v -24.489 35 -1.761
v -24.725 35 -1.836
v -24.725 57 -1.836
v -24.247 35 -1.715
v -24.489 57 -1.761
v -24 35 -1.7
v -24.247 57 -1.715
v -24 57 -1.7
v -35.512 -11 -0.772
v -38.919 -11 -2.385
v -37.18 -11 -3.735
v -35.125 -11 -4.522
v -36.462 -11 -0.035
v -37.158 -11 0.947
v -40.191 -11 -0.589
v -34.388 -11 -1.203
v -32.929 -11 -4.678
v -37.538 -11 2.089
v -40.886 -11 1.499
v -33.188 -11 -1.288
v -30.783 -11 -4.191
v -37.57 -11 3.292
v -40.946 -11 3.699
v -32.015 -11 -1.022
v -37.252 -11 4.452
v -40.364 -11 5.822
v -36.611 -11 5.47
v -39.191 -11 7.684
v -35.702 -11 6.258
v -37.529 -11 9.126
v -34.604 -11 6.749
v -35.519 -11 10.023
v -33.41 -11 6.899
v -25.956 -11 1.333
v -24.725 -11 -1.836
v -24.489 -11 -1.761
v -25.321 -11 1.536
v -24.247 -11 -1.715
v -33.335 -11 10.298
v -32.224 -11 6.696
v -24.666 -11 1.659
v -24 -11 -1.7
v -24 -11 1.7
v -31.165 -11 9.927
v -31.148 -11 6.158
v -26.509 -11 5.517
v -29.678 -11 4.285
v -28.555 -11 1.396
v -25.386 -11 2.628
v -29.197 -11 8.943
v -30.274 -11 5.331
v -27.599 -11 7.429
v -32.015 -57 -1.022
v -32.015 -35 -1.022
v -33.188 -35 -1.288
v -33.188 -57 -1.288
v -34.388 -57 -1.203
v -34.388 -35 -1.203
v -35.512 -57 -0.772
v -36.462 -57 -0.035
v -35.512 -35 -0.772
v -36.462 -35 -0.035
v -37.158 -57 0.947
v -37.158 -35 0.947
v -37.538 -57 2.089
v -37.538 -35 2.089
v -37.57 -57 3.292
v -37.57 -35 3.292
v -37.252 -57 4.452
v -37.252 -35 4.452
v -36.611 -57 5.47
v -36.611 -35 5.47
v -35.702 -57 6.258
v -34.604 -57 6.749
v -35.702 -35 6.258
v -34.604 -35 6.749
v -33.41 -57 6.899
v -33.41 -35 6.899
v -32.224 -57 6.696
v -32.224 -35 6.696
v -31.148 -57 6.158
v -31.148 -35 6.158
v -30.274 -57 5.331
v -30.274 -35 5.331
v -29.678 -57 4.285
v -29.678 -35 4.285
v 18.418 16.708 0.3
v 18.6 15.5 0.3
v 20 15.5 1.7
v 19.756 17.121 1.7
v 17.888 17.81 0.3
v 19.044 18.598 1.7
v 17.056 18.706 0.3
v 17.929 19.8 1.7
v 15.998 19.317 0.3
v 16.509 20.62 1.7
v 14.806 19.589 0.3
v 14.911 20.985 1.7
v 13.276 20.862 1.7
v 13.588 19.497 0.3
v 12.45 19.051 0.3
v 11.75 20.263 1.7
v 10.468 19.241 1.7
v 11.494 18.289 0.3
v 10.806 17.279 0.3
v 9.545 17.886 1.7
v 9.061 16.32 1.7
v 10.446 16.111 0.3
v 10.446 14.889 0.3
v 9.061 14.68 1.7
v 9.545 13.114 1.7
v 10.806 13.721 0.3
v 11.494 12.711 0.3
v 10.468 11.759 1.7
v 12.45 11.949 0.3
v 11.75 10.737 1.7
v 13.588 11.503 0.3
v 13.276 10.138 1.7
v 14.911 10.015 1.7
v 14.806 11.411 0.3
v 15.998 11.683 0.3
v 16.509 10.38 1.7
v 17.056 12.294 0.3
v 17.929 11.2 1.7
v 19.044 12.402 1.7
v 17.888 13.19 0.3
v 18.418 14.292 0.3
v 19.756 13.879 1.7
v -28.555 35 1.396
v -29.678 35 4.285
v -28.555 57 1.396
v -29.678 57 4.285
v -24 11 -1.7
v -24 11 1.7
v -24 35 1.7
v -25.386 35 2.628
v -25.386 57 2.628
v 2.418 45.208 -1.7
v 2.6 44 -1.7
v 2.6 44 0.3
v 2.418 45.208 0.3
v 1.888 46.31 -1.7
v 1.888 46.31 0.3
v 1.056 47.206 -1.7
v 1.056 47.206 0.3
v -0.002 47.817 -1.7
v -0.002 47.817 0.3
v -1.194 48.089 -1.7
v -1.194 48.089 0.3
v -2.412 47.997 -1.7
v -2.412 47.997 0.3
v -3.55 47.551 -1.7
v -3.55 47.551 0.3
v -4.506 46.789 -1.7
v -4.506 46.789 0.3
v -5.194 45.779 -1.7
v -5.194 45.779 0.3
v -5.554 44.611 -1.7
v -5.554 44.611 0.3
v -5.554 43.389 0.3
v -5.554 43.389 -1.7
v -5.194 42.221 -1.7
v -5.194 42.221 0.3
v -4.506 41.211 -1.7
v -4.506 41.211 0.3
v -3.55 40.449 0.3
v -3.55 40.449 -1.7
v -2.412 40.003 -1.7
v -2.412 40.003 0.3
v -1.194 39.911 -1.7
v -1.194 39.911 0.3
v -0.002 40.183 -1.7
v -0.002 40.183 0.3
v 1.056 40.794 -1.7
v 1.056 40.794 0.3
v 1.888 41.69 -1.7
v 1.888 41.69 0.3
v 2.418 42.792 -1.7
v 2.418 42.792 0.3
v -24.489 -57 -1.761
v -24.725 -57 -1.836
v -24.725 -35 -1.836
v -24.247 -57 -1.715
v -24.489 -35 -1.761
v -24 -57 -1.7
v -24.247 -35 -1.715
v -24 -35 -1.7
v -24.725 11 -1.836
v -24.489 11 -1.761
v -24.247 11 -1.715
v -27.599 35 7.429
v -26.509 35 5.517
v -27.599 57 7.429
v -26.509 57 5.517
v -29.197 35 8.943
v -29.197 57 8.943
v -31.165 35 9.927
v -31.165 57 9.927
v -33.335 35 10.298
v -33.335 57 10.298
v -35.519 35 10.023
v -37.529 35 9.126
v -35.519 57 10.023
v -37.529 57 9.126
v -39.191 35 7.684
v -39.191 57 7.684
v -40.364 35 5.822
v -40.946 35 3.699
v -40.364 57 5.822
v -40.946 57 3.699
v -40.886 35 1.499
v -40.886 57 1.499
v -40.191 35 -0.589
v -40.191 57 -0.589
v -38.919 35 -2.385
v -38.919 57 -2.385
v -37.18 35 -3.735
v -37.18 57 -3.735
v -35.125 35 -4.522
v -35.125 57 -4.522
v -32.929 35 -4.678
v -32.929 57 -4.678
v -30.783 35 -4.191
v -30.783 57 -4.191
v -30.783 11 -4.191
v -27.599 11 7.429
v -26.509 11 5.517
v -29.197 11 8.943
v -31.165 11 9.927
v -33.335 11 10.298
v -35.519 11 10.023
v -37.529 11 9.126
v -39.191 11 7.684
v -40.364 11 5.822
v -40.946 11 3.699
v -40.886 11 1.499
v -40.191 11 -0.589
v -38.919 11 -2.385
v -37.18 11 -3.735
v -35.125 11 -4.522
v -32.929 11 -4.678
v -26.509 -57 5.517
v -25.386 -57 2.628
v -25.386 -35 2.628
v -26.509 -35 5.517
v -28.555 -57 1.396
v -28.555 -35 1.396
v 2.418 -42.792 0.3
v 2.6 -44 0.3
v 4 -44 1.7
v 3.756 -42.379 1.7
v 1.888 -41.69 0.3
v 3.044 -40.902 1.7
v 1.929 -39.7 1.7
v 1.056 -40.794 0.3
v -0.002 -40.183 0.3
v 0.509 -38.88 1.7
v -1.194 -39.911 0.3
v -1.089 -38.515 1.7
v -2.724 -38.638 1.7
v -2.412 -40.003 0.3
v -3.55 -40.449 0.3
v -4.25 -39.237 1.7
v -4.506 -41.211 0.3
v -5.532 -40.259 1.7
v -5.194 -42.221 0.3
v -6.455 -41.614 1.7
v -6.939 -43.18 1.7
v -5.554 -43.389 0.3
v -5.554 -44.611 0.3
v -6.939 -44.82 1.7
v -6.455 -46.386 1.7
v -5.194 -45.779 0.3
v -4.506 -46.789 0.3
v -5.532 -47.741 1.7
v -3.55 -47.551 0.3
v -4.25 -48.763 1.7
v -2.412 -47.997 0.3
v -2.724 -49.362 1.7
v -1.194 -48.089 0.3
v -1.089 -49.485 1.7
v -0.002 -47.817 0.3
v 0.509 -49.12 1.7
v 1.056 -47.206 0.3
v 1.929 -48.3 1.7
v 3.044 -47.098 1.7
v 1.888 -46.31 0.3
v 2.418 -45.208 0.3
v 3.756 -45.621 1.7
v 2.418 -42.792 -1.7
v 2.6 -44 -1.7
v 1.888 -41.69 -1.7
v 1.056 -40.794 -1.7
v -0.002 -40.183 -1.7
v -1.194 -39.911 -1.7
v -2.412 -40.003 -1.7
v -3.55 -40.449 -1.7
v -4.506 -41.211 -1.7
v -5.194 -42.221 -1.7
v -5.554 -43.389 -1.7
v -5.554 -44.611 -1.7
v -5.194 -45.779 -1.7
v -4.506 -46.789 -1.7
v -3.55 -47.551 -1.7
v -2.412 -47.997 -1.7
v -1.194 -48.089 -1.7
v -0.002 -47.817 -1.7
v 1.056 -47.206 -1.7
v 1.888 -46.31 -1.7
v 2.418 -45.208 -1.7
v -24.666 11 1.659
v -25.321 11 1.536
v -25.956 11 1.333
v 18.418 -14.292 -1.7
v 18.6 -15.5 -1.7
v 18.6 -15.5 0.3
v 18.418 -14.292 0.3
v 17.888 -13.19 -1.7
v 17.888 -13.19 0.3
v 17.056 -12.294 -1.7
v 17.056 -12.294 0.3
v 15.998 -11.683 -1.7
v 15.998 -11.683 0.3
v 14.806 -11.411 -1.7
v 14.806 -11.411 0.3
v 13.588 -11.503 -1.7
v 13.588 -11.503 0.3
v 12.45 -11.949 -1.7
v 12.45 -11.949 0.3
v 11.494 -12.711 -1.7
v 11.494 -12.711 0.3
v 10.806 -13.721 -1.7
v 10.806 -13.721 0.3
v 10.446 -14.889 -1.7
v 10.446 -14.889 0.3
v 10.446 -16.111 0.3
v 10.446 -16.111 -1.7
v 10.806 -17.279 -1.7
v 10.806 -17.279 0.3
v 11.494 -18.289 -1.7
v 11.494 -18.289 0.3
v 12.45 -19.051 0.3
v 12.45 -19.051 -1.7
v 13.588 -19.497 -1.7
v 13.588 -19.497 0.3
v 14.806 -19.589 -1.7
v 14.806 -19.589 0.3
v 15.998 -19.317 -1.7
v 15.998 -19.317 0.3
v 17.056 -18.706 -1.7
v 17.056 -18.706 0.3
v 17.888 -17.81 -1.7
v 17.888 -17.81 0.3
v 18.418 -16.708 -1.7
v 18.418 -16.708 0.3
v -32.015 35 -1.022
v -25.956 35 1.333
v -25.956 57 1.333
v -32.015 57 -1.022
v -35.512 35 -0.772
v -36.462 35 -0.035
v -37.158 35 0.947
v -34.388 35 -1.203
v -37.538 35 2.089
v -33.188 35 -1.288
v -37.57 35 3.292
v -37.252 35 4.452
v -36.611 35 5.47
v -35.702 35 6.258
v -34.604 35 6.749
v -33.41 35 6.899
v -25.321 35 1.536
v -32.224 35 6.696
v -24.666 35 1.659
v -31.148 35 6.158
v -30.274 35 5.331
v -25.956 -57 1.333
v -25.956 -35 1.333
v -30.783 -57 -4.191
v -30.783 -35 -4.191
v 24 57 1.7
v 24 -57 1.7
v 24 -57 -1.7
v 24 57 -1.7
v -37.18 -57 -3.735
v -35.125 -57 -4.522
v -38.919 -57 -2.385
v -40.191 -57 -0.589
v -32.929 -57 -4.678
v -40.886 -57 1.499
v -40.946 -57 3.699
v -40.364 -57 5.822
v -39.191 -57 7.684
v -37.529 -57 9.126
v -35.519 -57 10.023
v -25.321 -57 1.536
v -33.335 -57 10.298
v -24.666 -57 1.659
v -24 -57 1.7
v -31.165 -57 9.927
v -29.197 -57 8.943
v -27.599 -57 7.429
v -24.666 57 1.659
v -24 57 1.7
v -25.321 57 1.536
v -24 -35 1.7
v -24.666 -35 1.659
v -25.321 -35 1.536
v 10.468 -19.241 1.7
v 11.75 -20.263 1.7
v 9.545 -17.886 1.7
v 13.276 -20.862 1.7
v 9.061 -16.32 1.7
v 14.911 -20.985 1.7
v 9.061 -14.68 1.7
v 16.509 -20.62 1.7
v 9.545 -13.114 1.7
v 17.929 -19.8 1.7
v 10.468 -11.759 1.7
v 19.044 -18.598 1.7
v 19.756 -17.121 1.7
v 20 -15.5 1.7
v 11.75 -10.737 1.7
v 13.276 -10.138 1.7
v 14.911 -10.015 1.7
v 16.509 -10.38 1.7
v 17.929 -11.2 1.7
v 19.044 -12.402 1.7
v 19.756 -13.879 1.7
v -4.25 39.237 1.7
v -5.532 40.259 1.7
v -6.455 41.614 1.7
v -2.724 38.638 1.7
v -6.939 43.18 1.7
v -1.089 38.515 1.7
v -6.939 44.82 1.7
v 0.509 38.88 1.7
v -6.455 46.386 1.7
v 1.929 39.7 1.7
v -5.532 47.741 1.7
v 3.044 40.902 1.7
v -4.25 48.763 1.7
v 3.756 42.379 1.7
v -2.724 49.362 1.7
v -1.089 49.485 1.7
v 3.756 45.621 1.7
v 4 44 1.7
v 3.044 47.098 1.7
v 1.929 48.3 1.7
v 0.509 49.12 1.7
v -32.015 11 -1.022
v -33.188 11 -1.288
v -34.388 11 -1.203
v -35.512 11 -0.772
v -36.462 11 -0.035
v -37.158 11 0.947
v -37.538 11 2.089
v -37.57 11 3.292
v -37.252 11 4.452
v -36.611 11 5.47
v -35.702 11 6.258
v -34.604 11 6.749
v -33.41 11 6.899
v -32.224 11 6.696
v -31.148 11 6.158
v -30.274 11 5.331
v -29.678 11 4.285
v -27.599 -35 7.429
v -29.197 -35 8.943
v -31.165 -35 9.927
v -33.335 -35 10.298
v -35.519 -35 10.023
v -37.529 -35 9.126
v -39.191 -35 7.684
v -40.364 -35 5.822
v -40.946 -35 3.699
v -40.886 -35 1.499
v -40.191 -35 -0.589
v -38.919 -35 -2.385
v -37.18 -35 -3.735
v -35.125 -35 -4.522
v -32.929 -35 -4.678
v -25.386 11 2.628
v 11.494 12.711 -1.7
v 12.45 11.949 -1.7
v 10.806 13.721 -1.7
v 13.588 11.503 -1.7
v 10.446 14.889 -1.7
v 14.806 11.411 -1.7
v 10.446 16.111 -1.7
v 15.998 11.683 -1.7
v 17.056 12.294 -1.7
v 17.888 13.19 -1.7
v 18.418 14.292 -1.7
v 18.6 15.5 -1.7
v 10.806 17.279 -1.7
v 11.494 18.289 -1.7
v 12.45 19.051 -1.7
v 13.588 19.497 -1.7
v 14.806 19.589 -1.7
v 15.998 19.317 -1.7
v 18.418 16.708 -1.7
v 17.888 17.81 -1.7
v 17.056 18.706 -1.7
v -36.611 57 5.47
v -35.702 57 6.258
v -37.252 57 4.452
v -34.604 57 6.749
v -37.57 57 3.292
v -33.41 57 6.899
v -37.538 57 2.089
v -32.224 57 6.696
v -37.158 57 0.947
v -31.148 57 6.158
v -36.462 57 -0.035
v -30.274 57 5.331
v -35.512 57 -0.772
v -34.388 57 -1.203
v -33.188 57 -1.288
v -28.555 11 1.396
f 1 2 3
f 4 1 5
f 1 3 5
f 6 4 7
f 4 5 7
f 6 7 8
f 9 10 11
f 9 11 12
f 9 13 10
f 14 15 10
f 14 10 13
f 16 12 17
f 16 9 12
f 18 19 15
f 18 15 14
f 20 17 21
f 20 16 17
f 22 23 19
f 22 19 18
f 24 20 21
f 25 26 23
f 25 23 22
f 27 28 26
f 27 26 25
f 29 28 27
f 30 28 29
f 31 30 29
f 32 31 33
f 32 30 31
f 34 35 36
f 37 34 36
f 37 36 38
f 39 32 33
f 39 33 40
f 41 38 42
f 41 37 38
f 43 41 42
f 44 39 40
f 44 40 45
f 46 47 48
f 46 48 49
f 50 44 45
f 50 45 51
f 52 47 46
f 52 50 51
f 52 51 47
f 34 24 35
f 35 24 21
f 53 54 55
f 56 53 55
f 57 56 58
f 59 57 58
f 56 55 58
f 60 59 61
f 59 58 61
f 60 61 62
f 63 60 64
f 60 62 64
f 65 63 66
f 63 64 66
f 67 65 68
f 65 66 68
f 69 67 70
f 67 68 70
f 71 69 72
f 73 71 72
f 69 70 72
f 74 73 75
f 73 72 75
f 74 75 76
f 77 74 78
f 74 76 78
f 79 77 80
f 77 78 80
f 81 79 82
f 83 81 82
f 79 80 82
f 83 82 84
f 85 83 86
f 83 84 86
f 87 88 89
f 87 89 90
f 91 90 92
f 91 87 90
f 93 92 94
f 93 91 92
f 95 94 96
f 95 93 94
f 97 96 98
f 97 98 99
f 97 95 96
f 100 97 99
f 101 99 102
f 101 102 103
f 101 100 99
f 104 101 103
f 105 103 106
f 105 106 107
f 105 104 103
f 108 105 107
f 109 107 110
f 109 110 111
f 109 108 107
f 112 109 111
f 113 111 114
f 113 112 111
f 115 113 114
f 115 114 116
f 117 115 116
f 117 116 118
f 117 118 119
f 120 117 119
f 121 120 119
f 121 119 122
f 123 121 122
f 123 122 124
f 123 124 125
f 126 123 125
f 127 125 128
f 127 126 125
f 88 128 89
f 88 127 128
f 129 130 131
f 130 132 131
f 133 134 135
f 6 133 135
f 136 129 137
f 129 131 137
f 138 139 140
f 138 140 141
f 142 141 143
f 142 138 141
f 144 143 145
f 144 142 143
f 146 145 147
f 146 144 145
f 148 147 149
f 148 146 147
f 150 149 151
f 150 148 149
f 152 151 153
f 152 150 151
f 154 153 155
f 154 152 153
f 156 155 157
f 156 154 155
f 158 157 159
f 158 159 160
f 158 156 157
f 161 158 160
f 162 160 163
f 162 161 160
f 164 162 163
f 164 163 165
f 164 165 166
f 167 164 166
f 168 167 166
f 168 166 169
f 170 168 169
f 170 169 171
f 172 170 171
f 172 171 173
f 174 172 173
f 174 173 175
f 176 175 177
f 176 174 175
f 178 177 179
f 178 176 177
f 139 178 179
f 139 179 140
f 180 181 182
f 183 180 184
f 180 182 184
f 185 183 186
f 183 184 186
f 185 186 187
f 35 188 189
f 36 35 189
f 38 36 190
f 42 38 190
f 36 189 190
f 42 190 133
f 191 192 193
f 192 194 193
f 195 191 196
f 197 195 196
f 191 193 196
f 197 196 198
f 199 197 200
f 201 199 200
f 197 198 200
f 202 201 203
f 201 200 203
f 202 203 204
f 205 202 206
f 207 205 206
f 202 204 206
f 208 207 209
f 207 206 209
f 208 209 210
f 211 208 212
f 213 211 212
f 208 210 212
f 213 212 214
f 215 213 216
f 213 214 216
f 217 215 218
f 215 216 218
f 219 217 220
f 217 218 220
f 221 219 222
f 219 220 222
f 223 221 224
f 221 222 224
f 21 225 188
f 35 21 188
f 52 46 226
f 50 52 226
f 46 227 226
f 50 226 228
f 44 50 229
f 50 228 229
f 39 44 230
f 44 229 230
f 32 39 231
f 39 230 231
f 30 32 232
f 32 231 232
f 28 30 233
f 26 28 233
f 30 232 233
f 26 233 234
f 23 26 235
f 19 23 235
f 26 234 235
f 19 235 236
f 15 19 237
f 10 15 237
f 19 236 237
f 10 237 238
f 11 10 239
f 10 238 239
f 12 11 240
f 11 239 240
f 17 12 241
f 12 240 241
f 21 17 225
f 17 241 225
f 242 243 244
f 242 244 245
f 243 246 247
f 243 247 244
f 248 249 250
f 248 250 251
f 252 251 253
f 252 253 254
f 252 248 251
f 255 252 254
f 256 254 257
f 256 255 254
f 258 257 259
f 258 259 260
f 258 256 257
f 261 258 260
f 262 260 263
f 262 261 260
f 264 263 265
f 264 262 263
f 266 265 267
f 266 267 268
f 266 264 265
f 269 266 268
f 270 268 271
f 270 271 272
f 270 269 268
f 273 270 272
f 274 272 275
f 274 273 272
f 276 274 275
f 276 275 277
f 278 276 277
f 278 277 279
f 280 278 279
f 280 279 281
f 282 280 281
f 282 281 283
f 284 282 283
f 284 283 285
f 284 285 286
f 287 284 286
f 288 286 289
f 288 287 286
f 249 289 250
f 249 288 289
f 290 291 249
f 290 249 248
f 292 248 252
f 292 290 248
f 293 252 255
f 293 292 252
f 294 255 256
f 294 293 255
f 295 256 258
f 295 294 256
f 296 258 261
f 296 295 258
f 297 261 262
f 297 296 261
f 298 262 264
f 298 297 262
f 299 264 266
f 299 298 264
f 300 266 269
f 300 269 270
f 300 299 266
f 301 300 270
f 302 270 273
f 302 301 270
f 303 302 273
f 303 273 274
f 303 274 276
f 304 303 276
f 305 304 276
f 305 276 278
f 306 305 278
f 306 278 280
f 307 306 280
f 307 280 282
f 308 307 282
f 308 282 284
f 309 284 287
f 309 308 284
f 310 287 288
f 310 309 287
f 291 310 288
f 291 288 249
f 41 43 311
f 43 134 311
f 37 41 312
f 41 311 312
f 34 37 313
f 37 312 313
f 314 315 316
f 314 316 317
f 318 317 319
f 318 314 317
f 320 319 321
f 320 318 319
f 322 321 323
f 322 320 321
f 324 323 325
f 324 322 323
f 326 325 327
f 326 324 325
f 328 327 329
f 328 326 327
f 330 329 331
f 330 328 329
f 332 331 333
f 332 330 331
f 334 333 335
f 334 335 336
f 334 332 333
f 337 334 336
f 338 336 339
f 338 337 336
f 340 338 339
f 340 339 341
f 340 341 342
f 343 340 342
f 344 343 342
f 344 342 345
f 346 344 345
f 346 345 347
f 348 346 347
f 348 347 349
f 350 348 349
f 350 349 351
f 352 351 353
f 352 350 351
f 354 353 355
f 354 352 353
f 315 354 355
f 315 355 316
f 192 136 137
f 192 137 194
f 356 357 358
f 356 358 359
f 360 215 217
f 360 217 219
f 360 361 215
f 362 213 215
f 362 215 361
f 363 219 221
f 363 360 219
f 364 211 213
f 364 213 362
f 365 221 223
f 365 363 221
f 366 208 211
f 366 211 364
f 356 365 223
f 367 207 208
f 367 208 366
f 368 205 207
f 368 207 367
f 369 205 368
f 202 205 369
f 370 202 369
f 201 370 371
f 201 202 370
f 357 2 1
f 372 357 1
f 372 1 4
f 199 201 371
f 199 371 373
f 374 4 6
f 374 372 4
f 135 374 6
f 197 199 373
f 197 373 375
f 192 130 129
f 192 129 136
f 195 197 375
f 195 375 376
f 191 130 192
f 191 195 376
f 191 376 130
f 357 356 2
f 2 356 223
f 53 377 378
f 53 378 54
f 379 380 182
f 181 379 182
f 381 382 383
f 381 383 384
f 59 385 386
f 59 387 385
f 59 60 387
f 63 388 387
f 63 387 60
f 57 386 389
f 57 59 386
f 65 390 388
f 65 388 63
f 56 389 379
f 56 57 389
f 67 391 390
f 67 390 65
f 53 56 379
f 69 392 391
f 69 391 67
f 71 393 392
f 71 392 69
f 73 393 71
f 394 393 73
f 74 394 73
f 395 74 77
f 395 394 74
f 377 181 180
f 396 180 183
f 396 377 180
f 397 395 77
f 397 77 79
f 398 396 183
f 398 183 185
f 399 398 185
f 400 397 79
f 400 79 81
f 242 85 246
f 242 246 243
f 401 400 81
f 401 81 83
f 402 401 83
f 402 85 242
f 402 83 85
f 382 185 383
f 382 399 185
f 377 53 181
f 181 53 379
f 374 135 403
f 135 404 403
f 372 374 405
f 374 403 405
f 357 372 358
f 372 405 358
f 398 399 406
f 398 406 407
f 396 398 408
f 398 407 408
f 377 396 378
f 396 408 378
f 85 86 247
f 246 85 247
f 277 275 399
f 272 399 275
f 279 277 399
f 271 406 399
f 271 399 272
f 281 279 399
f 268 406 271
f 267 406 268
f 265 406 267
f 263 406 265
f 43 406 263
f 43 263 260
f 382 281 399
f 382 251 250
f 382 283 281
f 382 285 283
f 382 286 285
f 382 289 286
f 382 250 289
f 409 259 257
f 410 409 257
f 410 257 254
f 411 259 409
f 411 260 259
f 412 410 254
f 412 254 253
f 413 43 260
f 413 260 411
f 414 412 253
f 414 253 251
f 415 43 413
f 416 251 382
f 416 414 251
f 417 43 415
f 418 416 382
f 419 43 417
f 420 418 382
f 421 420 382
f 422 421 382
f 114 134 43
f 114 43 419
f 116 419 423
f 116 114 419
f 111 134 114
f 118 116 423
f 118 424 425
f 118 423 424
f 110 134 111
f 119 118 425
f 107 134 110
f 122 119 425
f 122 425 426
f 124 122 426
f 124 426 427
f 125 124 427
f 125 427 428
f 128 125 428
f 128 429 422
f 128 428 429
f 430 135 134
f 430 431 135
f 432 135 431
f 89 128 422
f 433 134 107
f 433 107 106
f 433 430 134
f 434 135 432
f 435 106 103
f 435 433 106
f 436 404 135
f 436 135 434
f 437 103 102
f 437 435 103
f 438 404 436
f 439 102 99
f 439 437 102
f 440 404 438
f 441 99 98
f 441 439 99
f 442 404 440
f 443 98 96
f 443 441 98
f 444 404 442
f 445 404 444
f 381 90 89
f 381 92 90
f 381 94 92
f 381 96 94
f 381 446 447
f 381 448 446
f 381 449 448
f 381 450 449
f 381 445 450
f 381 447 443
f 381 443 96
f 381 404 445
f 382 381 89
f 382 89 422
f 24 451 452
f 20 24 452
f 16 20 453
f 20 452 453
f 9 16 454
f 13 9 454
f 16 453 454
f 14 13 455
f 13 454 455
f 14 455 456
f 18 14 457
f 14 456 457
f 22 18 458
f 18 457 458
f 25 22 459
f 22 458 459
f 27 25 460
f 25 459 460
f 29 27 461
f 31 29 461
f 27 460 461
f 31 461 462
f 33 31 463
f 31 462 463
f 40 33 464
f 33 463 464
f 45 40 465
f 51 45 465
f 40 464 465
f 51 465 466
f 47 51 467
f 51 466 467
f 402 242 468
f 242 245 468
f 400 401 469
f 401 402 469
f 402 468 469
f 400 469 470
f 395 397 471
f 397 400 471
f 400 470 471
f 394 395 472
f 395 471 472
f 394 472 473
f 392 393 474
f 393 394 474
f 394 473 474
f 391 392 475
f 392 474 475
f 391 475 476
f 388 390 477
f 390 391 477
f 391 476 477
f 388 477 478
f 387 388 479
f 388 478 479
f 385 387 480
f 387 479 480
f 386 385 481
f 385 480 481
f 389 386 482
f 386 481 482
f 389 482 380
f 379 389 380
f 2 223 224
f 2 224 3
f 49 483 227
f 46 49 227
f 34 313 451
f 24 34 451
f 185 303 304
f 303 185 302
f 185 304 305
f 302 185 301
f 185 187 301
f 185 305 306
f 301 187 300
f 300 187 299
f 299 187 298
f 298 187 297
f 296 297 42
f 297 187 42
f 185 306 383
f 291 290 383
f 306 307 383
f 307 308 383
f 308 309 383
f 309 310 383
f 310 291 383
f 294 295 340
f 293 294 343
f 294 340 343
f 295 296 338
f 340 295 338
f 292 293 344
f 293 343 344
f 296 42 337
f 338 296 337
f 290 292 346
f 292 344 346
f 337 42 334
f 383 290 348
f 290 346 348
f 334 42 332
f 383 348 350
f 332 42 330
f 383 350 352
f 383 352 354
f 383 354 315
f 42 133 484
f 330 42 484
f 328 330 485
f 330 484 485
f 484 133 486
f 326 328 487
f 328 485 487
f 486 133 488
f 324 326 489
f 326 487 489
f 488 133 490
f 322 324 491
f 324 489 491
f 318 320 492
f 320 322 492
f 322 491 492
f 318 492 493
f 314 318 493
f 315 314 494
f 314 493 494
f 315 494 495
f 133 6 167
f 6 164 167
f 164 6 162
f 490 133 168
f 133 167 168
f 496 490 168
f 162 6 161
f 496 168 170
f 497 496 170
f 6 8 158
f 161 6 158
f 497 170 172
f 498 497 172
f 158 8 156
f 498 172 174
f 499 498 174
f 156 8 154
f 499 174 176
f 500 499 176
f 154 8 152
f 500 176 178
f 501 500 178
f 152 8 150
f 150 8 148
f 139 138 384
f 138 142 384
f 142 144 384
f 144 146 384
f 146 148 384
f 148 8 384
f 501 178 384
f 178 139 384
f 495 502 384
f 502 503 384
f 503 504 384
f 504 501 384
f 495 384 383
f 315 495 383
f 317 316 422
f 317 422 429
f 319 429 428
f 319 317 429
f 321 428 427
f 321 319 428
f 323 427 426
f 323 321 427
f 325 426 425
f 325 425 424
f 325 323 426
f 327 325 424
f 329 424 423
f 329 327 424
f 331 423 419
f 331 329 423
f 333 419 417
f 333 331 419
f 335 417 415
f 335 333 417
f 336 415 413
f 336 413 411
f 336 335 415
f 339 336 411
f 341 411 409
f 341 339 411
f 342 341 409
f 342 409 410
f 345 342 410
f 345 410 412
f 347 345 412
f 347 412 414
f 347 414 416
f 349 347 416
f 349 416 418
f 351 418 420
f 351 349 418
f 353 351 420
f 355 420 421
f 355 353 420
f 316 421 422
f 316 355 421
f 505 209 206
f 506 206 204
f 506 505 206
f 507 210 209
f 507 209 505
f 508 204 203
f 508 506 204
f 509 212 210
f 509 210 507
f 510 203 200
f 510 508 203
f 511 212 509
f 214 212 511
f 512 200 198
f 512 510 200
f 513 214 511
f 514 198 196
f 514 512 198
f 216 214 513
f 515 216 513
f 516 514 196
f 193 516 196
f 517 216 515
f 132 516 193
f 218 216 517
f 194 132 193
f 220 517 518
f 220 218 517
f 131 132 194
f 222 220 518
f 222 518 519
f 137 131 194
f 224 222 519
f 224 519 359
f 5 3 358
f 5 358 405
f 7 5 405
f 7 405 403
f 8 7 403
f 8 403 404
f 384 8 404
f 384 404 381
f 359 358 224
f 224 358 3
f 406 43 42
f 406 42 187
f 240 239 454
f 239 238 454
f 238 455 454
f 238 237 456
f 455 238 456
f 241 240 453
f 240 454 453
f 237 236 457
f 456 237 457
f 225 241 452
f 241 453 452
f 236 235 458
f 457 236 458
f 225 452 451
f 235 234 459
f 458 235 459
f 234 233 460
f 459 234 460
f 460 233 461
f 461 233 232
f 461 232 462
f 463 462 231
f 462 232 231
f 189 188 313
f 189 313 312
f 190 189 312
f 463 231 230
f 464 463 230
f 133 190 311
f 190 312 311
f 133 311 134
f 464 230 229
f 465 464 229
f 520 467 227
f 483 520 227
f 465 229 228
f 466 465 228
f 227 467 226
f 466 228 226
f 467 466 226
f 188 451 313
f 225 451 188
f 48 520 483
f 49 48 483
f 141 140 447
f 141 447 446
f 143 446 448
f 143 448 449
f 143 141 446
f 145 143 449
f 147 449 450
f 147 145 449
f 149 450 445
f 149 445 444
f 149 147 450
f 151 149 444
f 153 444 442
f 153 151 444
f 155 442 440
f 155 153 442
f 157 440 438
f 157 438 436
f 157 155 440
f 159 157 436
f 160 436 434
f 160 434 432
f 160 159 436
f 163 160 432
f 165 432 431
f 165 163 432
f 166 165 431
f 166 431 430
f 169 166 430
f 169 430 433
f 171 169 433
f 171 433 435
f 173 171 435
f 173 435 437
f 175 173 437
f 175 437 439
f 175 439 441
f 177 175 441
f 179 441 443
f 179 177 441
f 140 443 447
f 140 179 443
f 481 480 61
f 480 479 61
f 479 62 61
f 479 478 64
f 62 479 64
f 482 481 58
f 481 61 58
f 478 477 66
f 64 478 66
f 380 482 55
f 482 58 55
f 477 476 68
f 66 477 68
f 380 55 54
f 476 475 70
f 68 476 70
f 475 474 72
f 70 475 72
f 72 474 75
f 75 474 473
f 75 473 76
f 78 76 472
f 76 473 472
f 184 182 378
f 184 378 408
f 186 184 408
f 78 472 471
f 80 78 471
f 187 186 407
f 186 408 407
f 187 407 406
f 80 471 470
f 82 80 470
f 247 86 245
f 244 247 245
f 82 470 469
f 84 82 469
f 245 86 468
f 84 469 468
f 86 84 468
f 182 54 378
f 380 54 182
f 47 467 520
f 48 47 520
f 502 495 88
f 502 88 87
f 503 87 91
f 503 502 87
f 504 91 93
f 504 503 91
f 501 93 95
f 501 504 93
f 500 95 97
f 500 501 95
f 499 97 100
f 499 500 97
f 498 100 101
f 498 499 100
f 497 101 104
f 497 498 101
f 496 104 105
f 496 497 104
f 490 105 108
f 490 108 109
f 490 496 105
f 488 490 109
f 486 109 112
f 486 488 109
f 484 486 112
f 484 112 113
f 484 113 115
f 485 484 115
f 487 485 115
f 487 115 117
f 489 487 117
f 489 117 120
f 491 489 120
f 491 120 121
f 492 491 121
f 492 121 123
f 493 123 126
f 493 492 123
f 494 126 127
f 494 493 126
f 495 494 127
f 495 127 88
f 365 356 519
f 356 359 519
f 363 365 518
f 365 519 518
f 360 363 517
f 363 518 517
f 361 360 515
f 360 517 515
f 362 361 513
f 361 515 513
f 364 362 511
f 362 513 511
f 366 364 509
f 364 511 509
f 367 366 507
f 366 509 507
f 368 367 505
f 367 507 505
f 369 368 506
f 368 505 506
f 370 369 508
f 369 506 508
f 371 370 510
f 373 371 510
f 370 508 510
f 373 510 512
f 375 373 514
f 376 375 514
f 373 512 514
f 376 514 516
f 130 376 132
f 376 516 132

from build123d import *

# Parameters (mm, degrees)
BODYS_W                       = 48
BODYS_H                       = 114
BODY_DEPTH                    = 1.7
MIRROR1_START                 = -1.7
MIRROR1_OUTLINE_R             = 4.1
MIRROR1_DEPTH                 = 3.4
KNUCKLEBODY_REACH             = 63.87
KNUCKLEBODY_DIRECTION_2_REACH = 63.87
HOLECHAMFER_SIZE              = 1.4
KNUCKLECUTS_W                 = 17
KNUCKLECUTS_H                 = 24
KNUCKLECUT_DEPTH              = 71.965414111


# Read off the part's stored shape, not the designer's step: Mirror1
with BuildPart() as part:
    # BodyS → Body (new, symmetric)
    with BuildSketch(Plane.XY):
        Rectangle(BODYS_W, BODYS_H)
    extrude(amount=BODY_DEPTH, both=True)

    # Mirror1 outline → Mirror1 (cut)
    with BuildSketch(Plane.XY.offset(MIRROR1_START)):
        with Locations((14.5, 15.5)):
            Circle(MIRROR1_OUTLINE_R)
        with Locations((-1.5, 44)):
            Circle(MIRROR1_OUTLINE_R)
        with Locations((14.5, -15.5)):
            Circle(MIRROR1_OUTLINE_R)
        with Locations((-1.5, -44)):
            Circle(MIRROR1_OUTLINE_R)
    extrude(amount=MIRROR1_DEPTH, mode=Mode.SUBTRACT)

    # KnuckleBody: up to this face of the body (flat: up to its plane)
    knucklebody_end = Plane(part.part.faces().sort_by_distance((0, 57, 0))[0])
    # KnuckleBodyS → KnuckleBody (add, up to the picked face)
    with BuildSketch(Plane(origin=(0, 0, 0), x_dir=(1, 0, 0), z_dir=(0, 1, 0)), mode=Mode.PRIVATE) as knucklebody_sk1:
        with BuildLine():
            Line((-30.783018868, 4.190566038), (-24.724528302, 1.835849057))
            ThreePointArc((-24.724528302, 1.835849057), (-24.36857707, 1.734255626), (-24, 1.7))
            Line((-24, 1.7), (-24, -1.7))
            ThreePointArc((-24, -1.7), (-24.995158089, -1.607509809), (-25.956226415, -1.333207547))
            Line((-25.956226415, -1.333207547), (-32.014716981, 1.021509434))
            ThreePointArc((-32.014716981, 1.021509434), (-37.25246893, -4.451961541), (-29.678490566, -4.285283019))
            Line((-29.678490566, -4.285283019), (-28.555471698, -1.395849057))
            Line((-28.555471698, -1.395849057), (-25.386415094, -2.62754717))
            Line((-25.386415094, -2.62754717), (-26.509433962, -5.516981132))
            ThreePointArc((-26.509433962, -5.516981132), (-40.364272432, -5.821880867), (-30.783018868, 4.190566038))
        make_face()
    knucklebody_tool1 = split(extrude(knucklebody_sk1.sketch, amount=KNUCKLEBODY_REACH, mode=Mode.PRIVATE), bisect_by=knucklebody_end, keep=Keep.BOTH, mode=Mode.PRIVATE)
    add(knucklebody_tool1.solids().sort_by(Axis((-40.156774, 0, 5.730533), (0, 1, 0)))[0])

    # KnuckleBody direction 2: up to this face of the body (flat: up to its plane)
    knucklebody_direction_2_end = Plane(part.part.faces().sort_by_distance((0, -57, 0))[0])
    # KnuckleBodyS → KnuckleBody direction 2 (add, up to the picked face)
    with BuildSketch(Plane(origin=(0, 0, 0), x_dir=(1, 0, 0), z_dir=(0, 1, 0)), mode=Mode.PRIVATE) as knucklebody_direction_2_sk1:
        with BuildLine():
            Line((-30.783018868, 4.190566038), (-24.724528302, 1.835849057))
            ThreePointArc((-24.724528302, 1.835849057), (-24.36857707, 1.734255626), (-24, 1.7))
            Line((-24, 1.7), (-24, -1.7))
            ThreePointArc((-24, -1.7), (-24.995158089, -1.607509809), (-25.956226415, -1.333207547))
            Line((-25.956226415, -1.333207547), (-32.014716981, 1.021509434))
            ThreePointArc((-32.014716981, 1.021509434), (-37.25246893, -4.451961541), (-29.678490566, -4.285283019))
            Line((-29.678490566, -4.285283019), (-28.555471698, -1.395849057))
            Line((-28.555471698, -1.395849057), (-25.386415094, -2.62754717))
            Line((-25.386415094, -2.62754717), (-26.509433962, -5.516981132))
            ThreePointArc((-26.509433962, -5.516981132), (-40.364272432, -5.821880867), (-30.783018868, 4.190566038))
        make_face()
    knucklebody_direction_2_tool1 = split(extrude(knucklebody_direction_2_sk1.sketch, amount=-KNUCKLEBODY_DIRECTION_2_REACH, mode=Mode.PRIVATE), bisect_by=knucklebody_direction_2_end, keep=Keep.BOTH, mode=Mode.PRIVATE)
    add(knucklebody_direction_2_tool1.solids().sort_by(Axis((-40.156774, 0, 5.730533), (0, -1, 0)))[0])

    # HoleChamfer
    holechamfer_edges = [part.edges().sort_by_distance(p)[0] for p in [
        (10.4, 15.5, 1.7),
        (-5.6, 44, 1.7),
        (10.4, -15.5, 1.7),
        (-5.6, -44, 1.7),
    ]]
    chamfer(holechamfer_edges, length=HOLECHAMFER_SIZE)

    # KnuckleCutS → KnuckleCut (cut, symmetric)
    with BuildSketch(Plane.XY):
        with Locations((-32.5, 23)):
            Rectangle(KNUCKLECUTS_W, KNUCKLECUTS_H)
    knucklecut = extrude(amount=KNUCKLECUT_DEPTH, both=True, mode=Mode.SUBTRACT)

    # KCVM: KnuckleCut across plane
    add(knucklecut.mirror(Plane.ZX), mode=Mode.SUBTRACT)


solid = part.part
